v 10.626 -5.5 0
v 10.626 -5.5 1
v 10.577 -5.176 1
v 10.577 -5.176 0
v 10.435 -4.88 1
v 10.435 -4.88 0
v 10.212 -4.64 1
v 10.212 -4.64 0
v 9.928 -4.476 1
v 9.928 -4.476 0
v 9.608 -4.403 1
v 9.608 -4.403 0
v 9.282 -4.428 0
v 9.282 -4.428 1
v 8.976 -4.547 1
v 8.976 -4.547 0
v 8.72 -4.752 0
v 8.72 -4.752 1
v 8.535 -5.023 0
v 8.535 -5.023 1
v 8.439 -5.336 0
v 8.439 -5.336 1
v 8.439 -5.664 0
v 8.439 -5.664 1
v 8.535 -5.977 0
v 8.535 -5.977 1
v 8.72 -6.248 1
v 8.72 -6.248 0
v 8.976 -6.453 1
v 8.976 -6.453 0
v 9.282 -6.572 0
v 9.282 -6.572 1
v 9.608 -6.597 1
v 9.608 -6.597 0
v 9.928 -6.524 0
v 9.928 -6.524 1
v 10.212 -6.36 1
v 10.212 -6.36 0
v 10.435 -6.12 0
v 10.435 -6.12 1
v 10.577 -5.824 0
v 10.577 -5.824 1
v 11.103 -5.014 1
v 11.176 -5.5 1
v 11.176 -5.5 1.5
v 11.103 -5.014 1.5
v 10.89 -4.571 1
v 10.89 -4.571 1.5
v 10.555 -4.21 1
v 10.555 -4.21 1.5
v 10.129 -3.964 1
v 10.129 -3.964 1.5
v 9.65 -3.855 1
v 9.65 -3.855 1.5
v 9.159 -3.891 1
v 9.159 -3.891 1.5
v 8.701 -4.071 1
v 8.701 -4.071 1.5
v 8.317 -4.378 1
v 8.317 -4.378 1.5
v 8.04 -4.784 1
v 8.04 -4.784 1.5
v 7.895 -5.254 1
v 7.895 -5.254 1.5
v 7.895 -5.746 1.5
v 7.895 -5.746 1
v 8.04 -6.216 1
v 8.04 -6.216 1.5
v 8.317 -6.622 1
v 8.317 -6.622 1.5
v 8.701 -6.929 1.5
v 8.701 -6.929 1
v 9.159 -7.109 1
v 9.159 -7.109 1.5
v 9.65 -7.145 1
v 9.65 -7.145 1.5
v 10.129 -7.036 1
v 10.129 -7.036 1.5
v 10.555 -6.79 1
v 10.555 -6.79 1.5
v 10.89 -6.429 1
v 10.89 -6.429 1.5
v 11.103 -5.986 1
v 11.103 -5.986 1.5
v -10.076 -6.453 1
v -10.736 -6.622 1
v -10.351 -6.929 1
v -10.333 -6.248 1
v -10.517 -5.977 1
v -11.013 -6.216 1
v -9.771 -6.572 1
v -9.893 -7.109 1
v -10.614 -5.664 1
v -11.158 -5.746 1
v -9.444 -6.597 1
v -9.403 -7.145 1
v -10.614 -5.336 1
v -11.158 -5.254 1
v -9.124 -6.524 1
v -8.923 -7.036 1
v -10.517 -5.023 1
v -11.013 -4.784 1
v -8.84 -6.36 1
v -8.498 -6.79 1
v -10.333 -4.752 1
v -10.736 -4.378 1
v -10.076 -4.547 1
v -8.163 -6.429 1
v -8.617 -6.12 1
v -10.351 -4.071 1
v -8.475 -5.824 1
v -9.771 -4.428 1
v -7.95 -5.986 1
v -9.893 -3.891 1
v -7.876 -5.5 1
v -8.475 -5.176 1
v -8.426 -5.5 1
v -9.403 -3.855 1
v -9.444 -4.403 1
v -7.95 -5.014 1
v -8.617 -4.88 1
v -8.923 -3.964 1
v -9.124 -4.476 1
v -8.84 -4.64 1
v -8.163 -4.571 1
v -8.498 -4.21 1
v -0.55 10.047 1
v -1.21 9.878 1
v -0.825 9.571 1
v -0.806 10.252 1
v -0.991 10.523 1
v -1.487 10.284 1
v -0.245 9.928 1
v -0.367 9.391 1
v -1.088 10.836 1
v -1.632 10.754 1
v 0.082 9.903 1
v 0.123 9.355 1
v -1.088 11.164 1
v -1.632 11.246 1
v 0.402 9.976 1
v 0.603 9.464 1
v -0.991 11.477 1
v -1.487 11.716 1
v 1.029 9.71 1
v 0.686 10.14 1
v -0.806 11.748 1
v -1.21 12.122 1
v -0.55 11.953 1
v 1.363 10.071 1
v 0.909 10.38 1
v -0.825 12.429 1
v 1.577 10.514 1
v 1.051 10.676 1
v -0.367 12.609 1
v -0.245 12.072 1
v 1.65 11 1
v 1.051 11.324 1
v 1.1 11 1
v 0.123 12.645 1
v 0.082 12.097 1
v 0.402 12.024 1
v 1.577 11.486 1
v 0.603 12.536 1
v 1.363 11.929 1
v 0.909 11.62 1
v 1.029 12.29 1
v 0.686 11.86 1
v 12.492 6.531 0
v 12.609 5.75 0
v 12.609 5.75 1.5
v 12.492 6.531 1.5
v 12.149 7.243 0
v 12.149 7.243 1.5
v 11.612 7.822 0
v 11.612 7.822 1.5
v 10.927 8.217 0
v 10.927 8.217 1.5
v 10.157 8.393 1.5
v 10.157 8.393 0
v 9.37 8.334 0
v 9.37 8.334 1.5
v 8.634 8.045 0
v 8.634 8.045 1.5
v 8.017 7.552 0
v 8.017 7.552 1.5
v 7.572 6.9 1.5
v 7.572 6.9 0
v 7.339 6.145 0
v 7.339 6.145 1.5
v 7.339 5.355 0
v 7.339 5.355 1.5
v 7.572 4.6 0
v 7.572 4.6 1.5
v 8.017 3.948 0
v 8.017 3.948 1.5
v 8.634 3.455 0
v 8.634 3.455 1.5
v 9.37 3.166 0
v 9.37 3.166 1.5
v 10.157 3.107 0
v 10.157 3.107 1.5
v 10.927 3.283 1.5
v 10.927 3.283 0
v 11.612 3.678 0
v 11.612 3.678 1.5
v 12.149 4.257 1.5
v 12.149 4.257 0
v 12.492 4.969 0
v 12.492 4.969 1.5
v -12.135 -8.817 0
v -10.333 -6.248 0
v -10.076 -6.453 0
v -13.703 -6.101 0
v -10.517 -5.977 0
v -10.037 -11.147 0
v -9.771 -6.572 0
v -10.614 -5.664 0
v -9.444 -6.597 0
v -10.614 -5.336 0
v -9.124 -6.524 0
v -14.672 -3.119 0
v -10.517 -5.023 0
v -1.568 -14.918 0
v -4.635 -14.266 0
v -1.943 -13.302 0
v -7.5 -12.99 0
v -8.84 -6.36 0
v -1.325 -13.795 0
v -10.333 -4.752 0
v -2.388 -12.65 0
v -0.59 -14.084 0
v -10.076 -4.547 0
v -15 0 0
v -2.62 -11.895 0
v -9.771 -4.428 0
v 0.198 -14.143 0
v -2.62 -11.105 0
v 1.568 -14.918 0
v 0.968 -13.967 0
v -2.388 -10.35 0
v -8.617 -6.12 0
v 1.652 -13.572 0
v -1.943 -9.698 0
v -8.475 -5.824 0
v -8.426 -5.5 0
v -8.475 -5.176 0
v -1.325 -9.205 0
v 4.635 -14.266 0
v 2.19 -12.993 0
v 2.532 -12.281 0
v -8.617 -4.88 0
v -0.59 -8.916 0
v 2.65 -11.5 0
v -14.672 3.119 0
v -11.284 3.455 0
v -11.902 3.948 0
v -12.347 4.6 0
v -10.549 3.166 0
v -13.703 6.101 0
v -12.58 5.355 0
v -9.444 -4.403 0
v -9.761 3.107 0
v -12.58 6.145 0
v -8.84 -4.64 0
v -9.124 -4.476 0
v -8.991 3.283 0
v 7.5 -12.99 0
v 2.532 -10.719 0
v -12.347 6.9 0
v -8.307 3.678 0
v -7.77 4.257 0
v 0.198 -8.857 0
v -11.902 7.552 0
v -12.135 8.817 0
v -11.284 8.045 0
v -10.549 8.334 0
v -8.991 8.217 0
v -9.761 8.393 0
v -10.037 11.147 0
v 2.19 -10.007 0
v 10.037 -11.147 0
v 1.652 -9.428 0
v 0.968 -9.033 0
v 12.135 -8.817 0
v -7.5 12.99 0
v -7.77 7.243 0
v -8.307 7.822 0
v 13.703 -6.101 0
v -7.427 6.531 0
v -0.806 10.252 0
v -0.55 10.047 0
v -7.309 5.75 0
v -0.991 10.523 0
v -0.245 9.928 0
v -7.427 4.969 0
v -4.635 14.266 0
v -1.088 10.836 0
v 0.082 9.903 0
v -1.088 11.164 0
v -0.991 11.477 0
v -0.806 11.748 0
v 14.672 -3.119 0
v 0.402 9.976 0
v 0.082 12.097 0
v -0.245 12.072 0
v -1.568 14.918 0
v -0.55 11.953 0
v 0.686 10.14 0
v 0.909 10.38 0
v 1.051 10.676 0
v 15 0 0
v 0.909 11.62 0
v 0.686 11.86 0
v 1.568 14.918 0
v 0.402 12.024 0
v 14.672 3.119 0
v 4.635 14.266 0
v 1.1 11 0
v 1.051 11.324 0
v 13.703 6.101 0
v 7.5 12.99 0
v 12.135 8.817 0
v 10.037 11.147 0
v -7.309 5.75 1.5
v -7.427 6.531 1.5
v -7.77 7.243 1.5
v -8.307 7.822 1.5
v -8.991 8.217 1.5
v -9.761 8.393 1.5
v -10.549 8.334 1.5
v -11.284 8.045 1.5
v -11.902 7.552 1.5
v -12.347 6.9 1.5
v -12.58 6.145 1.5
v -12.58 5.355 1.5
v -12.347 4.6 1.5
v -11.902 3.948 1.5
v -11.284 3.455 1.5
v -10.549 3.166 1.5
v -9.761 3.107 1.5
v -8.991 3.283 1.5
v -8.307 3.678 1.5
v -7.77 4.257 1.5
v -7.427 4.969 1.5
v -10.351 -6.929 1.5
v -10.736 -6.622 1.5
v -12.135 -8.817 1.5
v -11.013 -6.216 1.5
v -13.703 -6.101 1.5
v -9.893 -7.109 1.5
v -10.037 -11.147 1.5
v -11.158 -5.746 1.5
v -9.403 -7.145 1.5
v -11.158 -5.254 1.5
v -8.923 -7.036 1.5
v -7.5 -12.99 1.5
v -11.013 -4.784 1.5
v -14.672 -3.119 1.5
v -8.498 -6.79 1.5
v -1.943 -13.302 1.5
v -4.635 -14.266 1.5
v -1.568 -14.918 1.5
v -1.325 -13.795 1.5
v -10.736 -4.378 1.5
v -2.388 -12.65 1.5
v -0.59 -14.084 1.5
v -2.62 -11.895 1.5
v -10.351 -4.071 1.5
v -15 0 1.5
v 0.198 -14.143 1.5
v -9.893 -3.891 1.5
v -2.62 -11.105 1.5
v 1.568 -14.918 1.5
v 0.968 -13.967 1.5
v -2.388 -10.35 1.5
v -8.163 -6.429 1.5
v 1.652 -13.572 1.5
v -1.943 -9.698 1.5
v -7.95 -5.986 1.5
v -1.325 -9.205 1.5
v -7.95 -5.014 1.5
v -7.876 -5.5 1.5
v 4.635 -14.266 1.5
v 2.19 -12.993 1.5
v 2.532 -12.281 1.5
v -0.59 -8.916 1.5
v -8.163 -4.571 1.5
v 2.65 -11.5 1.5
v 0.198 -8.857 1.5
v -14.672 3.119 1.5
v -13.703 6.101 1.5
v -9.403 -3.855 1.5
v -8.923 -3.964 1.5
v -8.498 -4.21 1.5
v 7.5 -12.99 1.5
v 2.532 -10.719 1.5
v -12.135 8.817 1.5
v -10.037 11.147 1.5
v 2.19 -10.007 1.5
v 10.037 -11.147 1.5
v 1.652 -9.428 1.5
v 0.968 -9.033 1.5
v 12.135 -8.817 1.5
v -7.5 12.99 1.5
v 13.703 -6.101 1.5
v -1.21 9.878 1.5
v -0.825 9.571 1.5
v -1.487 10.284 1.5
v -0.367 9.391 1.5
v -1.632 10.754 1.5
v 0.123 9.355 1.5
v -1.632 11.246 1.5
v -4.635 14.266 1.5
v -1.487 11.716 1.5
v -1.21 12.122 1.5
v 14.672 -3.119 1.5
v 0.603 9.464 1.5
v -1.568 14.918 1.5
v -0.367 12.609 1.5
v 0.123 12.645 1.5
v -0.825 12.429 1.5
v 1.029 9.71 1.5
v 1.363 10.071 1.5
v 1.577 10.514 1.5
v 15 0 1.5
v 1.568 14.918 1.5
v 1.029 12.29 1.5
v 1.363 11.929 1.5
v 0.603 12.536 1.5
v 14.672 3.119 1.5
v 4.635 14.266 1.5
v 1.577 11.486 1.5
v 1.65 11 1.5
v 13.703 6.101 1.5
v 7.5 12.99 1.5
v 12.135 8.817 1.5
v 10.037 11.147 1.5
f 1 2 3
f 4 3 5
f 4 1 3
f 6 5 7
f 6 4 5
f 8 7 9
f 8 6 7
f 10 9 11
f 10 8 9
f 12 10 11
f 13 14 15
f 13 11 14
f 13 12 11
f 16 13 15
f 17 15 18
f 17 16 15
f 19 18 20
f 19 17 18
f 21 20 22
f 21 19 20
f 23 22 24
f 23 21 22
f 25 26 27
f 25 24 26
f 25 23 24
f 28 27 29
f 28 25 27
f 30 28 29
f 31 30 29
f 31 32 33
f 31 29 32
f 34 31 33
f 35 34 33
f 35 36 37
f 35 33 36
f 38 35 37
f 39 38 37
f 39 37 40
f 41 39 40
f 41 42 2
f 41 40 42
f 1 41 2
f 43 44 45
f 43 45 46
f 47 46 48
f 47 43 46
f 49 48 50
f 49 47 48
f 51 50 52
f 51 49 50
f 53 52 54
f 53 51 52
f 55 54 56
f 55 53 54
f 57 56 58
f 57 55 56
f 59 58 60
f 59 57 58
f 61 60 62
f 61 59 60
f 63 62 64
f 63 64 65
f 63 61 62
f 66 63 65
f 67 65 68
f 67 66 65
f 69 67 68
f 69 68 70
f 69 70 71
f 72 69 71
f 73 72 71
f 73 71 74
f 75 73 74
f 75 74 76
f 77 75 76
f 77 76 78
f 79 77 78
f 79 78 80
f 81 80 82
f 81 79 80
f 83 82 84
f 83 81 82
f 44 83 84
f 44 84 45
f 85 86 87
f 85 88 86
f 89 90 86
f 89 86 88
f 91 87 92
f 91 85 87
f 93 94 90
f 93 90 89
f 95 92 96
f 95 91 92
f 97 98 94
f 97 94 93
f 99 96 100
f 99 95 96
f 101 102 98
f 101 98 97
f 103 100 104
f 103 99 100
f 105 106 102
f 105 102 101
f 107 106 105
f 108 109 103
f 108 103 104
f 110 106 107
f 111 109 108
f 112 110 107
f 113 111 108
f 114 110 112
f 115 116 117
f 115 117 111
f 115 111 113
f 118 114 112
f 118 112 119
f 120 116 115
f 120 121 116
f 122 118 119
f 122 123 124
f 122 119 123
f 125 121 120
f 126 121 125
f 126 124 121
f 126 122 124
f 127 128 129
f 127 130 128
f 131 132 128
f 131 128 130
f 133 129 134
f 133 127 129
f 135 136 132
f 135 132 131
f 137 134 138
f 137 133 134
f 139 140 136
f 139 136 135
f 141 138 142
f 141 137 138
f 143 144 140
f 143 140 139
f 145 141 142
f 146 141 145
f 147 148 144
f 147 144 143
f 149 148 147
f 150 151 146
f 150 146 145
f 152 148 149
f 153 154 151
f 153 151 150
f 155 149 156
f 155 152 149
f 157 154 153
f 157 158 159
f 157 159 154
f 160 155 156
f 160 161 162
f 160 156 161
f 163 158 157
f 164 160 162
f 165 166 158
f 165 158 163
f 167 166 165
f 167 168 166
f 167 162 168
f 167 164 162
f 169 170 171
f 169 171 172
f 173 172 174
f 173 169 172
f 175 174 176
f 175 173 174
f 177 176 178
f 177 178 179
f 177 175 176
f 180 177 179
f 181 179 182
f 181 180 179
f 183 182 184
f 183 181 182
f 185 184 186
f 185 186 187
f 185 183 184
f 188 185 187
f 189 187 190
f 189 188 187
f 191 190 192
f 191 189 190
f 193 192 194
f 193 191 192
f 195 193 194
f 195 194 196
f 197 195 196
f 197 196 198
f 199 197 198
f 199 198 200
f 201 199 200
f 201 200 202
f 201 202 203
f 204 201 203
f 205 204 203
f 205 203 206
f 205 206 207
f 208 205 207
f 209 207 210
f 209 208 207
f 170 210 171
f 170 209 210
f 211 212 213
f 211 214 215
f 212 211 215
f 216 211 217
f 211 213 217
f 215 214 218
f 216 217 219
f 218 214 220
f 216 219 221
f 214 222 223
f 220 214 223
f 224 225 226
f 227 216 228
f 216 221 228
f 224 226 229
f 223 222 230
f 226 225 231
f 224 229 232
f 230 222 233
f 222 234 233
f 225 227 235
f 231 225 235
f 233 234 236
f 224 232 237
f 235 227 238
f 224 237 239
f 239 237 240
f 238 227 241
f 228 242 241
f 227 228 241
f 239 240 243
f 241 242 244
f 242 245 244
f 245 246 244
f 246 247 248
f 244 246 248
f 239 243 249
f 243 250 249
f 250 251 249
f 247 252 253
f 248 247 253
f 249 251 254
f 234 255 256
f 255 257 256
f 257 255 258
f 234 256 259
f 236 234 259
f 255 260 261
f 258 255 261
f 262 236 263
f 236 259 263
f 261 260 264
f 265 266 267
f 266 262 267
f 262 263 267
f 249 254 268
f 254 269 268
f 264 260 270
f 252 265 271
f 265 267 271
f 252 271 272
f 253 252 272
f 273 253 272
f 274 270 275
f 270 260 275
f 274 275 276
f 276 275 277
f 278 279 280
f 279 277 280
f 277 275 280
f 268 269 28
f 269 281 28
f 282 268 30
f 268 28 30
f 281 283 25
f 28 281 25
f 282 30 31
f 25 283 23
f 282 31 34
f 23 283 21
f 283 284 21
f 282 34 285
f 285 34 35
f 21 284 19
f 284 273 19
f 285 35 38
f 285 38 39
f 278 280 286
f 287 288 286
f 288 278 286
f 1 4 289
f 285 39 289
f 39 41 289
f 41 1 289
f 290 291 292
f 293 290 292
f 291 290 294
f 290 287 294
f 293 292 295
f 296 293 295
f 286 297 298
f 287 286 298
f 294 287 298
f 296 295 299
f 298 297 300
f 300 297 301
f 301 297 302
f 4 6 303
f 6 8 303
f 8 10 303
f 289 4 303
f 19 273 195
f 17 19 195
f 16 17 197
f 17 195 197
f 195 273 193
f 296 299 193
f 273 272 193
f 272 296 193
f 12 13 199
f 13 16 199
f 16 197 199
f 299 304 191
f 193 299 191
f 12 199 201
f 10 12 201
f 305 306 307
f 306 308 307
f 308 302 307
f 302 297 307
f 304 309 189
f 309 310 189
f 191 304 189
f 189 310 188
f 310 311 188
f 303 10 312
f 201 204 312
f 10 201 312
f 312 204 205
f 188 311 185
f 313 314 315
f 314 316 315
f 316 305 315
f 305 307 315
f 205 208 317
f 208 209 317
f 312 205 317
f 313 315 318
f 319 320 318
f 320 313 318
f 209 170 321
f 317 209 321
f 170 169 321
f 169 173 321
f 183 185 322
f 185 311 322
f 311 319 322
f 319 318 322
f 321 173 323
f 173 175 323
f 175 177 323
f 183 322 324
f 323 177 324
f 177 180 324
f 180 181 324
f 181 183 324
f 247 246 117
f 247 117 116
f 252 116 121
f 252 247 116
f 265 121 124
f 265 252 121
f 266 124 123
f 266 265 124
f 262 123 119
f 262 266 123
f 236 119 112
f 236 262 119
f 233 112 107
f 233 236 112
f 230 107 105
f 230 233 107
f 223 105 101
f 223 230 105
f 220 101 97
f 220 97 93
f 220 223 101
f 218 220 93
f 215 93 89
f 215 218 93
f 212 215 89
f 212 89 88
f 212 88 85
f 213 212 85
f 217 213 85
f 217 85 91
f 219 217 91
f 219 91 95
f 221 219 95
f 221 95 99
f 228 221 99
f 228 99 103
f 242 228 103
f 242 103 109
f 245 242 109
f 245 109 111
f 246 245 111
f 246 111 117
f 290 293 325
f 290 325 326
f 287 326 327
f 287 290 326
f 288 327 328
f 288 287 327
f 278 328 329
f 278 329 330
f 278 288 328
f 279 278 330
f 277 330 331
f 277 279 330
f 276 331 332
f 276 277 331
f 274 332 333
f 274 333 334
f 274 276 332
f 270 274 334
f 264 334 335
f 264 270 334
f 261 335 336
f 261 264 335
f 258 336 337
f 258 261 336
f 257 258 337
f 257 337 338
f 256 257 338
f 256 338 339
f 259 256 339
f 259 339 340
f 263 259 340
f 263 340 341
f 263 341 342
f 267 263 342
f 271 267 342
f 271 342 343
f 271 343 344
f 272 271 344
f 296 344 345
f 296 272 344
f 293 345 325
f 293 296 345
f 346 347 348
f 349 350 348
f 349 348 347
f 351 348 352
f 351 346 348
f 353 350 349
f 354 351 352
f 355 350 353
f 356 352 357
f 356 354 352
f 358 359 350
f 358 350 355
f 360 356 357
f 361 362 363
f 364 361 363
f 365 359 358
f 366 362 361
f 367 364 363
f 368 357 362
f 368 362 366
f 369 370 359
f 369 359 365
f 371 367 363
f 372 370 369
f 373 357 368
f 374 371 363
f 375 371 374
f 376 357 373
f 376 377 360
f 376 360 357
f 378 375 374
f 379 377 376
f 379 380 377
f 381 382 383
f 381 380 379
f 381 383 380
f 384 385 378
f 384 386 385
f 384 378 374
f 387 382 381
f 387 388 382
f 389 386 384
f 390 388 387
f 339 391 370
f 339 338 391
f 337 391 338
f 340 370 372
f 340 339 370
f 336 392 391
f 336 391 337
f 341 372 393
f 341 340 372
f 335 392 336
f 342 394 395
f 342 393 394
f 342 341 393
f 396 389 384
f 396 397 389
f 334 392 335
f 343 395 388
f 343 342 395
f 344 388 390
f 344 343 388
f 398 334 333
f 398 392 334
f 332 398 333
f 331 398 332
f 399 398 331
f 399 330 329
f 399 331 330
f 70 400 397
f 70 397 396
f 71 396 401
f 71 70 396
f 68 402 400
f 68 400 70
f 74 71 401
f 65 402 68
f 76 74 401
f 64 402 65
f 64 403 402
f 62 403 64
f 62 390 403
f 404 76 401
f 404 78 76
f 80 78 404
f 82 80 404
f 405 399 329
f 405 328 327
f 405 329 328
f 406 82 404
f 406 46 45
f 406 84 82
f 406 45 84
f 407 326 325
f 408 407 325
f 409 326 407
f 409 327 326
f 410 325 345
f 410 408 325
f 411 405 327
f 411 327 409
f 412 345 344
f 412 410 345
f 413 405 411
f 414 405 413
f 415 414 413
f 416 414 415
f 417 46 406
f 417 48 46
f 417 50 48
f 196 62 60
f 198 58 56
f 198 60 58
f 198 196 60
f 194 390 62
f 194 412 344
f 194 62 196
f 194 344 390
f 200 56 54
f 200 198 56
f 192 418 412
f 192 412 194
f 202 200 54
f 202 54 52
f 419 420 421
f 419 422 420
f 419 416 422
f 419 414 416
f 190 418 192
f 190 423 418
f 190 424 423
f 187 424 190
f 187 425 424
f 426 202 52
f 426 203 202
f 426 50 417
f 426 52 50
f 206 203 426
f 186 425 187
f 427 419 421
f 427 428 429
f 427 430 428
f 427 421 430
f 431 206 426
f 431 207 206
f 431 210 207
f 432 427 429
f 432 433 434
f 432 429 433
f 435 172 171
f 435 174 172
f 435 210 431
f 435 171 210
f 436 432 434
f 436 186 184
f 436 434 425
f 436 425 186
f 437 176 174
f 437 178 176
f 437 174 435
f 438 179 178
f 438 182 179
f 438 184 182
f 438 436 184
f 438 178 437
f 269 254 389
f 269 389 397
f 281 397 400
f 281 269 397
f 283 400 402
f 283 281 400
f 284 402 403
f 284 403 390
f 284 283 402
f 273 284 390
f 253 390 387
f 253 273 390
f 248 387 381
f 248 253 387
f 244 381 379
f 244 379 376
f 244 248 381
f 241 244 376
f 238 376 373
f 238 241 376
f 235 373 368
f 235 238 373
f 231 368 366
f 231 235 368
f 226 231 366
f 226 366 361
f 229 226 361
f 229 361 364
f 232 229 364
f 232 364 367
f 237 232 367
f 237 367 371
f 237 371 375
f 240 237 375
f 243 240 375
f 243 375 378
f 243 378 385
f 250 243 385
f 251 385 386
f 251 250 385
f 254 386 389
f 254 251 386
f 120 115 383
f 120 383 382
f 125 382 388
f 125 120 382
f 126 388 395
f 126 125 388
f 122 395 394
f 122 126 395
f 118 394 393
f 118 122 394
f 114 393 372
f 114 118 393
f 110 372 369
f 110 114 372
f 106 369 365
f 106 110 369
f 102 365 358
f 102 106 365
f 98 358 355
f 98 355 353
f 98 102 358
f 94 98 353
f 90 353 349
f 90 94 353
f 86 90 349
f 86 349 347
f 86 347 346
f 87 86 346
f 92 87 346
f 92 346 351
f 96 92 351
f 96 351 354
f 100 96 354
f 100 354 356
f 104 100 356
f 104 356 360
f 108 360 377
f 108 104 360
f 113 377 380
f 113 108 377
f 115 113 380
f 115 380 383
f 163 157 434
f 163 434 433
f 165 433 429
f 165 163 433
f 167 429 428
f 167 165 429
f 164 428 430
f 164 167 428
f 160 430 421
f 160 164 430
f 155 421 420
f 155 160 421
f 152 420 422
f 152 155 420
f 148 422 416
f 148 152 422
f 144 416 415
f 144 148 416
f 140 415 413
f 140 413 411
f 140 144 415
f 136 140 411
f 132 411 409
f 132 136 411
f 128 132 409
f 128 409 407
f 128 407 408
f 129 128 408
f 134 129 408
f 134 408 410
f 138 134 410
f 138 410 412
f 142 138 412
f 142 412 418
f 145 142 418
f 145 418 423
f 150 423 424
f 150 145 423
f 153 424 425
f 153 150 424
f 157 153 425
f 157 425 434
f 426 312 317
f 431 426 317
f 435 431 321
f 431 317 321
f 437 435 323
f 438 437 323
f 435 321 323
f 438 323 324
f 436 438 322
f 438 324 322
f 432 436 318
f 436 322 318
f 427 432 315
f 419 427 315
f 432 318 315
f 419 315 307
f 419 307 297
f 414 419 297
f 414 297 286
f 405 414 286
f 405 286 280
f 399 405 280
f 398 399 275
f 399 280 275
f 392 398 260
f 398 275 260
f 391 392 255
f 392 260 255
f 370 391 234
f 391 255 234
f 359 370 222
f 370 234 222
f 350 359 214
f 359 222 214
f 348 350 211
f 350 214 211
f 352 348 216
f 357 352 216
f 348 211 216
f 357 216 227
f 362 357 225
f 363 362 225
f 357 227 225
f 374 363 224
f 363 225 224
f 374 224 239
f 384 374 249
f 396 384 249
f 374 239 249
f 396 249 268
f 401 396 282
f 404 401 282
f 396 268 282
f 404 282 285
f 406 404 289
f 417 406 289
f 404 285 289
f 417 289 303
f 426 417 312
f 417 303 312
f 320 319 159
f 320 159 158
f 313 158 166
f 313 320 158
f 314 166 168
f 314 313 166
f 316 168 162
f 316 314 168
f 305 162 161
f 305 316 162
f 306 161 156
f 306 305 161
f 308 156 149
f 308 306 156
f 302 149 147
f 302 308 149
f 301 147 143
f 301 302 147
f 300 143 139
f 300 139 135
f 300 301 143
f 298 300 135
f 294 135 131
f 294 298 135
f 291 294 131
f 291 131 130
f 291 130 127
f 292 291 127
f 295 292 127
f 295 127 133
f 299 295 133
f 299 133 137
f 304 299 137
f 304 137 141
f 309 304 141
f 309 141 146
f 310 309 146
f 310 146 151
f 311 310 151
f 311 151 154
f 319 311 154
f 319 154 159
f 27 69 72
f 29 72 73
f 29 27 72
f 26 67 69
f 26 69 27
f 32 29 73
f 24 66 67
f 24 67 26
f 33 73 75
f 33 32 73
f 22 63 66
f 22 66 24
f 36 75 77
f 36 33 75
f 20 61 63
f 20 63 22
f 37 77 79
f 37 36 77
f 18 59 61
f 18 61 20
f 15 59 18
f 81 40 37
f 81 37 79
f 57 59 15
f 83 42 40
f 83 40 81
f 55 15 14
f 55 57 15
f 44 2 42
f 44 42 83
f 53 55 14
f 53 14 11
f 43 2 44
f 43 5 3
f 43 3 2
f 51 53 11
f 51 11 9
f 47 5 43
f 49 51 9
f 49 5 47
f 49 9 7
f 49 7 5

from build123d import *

# Parameters (mm, degrees)
SKETCH1_R           = 15
SKETCH1_R_2         = 1.65
SKETCH1_R_3         = 2.65
SKETCH1_R_4         = 1.1
BOSS_EXTRUDE1_DEPTH = 1.5
CUT_EXTRUDE1_START  = 1
SKETCH1_5_R         = 1.65
SKETCH1_5_R_2       = 1.1
CUT_EXTRUDE1_DEPTH  = 0.5


with BuildPart() as part:
    # Sketch1 → Boss-Extrude1 (new body)
    # profile 1 of 4: a face of its own
    with BuildSketch(Plane.XY):
        Circle(SKETCH1_R)
        with Locations((-9.526279442, -5.5)):
            Circle(SKETCH1_R_2, mode=Mode.SUBTRACT)
        with Locations((9.526279442, -5.5)):
            Circle(SKETCH1_R_2, mode=Mode.SUBTRACT)
        with Locations((0, 11)):
            Circle(SKETCH1_R_2, mode=Mode.SUBTRACT)
        with Locations((-9.959292144, 5.75)):
            Circle(SKETCH1_R_3, mode=Mode.SUBTRACT)
        with Locations((0, -11.5)):
            Circle(SKETCH1_R_3, mode=Mode.SUBTRACT)
        with Locations((9.959292144, 5.75)):
            Circle(SKETCH1_R_3, mode=Mode.SUBTRACT)
    # profile 2 of 4: a face of its own
    with BuildSketch(Plane.XY):
        with Locations((9.526279442, -5.5)):
            Circle(SKETCH1_R_2)
        with Locations((9.526279442, -5.5)):
            Circle(SKETCH1_R_4, mode=Mode.SUBTRACT)
    # profile 3 of 4: a face of its own
    with BuildSketch(Plane.XY):
        with Locations((0, 11)):
            Circle(SKETCH1_R_2)
        with Locations((0, 11)):
            Circle(SKETCH1_R_4, mode=Mode.SUBTRACT)
    # profile 4 of 4: a face of its own
    with BuildSketch(Plane.XY):
        with Locations((-9.526279442, -5.5)):
            Circle(SKETCH1_R_2)
        with Locations((-9.526279442, -5.5)):
            Circle(SKETCH1_R_4, mode=Mode.SUBTRACT)
    extrude(amount=BOSS_EXTRUDE1_DEPTH)

    # Sketch1<5> → Cut-Extrude1 (cut)
    # profile 1 of 3: a face of its own
    with BuildSketch(Plane.XY.offset(CUT_EXTRUDE1_START)):
        with Locations((-9.526279442, -5.5)):
            Circle(SKETCH1_5_R)
        with Locations((-9.526279442, -5.5)):
            Circle(SKETCH1_5_R_2, mode=Mode.SUBTRACT)
    # profile 2 of 3: a face of its own
    with BuildSketch(Plane.XY.offset(CUT_EXTRUDE1_START)):
        with Locations((0, 11)):
            Circle(SKETCH1_5_R)
        with Locations((0, 11)):
            Circle(SKETCH1_5_R_2, mode=Mode.SUBTRACT)
    # profile 3 of 3: a face of its own
    with BuildSketch(Plane.XY.offset(CUT_EXTRUDE1_START)):
        with Locations((9.526279442, -5.5)):
            Circle(SKETCH1_5_R)
    extrude(amount=CUT_EXTRUDE1_DEPTH, mode=Mode.SUBTRACT)


solid = part.part
